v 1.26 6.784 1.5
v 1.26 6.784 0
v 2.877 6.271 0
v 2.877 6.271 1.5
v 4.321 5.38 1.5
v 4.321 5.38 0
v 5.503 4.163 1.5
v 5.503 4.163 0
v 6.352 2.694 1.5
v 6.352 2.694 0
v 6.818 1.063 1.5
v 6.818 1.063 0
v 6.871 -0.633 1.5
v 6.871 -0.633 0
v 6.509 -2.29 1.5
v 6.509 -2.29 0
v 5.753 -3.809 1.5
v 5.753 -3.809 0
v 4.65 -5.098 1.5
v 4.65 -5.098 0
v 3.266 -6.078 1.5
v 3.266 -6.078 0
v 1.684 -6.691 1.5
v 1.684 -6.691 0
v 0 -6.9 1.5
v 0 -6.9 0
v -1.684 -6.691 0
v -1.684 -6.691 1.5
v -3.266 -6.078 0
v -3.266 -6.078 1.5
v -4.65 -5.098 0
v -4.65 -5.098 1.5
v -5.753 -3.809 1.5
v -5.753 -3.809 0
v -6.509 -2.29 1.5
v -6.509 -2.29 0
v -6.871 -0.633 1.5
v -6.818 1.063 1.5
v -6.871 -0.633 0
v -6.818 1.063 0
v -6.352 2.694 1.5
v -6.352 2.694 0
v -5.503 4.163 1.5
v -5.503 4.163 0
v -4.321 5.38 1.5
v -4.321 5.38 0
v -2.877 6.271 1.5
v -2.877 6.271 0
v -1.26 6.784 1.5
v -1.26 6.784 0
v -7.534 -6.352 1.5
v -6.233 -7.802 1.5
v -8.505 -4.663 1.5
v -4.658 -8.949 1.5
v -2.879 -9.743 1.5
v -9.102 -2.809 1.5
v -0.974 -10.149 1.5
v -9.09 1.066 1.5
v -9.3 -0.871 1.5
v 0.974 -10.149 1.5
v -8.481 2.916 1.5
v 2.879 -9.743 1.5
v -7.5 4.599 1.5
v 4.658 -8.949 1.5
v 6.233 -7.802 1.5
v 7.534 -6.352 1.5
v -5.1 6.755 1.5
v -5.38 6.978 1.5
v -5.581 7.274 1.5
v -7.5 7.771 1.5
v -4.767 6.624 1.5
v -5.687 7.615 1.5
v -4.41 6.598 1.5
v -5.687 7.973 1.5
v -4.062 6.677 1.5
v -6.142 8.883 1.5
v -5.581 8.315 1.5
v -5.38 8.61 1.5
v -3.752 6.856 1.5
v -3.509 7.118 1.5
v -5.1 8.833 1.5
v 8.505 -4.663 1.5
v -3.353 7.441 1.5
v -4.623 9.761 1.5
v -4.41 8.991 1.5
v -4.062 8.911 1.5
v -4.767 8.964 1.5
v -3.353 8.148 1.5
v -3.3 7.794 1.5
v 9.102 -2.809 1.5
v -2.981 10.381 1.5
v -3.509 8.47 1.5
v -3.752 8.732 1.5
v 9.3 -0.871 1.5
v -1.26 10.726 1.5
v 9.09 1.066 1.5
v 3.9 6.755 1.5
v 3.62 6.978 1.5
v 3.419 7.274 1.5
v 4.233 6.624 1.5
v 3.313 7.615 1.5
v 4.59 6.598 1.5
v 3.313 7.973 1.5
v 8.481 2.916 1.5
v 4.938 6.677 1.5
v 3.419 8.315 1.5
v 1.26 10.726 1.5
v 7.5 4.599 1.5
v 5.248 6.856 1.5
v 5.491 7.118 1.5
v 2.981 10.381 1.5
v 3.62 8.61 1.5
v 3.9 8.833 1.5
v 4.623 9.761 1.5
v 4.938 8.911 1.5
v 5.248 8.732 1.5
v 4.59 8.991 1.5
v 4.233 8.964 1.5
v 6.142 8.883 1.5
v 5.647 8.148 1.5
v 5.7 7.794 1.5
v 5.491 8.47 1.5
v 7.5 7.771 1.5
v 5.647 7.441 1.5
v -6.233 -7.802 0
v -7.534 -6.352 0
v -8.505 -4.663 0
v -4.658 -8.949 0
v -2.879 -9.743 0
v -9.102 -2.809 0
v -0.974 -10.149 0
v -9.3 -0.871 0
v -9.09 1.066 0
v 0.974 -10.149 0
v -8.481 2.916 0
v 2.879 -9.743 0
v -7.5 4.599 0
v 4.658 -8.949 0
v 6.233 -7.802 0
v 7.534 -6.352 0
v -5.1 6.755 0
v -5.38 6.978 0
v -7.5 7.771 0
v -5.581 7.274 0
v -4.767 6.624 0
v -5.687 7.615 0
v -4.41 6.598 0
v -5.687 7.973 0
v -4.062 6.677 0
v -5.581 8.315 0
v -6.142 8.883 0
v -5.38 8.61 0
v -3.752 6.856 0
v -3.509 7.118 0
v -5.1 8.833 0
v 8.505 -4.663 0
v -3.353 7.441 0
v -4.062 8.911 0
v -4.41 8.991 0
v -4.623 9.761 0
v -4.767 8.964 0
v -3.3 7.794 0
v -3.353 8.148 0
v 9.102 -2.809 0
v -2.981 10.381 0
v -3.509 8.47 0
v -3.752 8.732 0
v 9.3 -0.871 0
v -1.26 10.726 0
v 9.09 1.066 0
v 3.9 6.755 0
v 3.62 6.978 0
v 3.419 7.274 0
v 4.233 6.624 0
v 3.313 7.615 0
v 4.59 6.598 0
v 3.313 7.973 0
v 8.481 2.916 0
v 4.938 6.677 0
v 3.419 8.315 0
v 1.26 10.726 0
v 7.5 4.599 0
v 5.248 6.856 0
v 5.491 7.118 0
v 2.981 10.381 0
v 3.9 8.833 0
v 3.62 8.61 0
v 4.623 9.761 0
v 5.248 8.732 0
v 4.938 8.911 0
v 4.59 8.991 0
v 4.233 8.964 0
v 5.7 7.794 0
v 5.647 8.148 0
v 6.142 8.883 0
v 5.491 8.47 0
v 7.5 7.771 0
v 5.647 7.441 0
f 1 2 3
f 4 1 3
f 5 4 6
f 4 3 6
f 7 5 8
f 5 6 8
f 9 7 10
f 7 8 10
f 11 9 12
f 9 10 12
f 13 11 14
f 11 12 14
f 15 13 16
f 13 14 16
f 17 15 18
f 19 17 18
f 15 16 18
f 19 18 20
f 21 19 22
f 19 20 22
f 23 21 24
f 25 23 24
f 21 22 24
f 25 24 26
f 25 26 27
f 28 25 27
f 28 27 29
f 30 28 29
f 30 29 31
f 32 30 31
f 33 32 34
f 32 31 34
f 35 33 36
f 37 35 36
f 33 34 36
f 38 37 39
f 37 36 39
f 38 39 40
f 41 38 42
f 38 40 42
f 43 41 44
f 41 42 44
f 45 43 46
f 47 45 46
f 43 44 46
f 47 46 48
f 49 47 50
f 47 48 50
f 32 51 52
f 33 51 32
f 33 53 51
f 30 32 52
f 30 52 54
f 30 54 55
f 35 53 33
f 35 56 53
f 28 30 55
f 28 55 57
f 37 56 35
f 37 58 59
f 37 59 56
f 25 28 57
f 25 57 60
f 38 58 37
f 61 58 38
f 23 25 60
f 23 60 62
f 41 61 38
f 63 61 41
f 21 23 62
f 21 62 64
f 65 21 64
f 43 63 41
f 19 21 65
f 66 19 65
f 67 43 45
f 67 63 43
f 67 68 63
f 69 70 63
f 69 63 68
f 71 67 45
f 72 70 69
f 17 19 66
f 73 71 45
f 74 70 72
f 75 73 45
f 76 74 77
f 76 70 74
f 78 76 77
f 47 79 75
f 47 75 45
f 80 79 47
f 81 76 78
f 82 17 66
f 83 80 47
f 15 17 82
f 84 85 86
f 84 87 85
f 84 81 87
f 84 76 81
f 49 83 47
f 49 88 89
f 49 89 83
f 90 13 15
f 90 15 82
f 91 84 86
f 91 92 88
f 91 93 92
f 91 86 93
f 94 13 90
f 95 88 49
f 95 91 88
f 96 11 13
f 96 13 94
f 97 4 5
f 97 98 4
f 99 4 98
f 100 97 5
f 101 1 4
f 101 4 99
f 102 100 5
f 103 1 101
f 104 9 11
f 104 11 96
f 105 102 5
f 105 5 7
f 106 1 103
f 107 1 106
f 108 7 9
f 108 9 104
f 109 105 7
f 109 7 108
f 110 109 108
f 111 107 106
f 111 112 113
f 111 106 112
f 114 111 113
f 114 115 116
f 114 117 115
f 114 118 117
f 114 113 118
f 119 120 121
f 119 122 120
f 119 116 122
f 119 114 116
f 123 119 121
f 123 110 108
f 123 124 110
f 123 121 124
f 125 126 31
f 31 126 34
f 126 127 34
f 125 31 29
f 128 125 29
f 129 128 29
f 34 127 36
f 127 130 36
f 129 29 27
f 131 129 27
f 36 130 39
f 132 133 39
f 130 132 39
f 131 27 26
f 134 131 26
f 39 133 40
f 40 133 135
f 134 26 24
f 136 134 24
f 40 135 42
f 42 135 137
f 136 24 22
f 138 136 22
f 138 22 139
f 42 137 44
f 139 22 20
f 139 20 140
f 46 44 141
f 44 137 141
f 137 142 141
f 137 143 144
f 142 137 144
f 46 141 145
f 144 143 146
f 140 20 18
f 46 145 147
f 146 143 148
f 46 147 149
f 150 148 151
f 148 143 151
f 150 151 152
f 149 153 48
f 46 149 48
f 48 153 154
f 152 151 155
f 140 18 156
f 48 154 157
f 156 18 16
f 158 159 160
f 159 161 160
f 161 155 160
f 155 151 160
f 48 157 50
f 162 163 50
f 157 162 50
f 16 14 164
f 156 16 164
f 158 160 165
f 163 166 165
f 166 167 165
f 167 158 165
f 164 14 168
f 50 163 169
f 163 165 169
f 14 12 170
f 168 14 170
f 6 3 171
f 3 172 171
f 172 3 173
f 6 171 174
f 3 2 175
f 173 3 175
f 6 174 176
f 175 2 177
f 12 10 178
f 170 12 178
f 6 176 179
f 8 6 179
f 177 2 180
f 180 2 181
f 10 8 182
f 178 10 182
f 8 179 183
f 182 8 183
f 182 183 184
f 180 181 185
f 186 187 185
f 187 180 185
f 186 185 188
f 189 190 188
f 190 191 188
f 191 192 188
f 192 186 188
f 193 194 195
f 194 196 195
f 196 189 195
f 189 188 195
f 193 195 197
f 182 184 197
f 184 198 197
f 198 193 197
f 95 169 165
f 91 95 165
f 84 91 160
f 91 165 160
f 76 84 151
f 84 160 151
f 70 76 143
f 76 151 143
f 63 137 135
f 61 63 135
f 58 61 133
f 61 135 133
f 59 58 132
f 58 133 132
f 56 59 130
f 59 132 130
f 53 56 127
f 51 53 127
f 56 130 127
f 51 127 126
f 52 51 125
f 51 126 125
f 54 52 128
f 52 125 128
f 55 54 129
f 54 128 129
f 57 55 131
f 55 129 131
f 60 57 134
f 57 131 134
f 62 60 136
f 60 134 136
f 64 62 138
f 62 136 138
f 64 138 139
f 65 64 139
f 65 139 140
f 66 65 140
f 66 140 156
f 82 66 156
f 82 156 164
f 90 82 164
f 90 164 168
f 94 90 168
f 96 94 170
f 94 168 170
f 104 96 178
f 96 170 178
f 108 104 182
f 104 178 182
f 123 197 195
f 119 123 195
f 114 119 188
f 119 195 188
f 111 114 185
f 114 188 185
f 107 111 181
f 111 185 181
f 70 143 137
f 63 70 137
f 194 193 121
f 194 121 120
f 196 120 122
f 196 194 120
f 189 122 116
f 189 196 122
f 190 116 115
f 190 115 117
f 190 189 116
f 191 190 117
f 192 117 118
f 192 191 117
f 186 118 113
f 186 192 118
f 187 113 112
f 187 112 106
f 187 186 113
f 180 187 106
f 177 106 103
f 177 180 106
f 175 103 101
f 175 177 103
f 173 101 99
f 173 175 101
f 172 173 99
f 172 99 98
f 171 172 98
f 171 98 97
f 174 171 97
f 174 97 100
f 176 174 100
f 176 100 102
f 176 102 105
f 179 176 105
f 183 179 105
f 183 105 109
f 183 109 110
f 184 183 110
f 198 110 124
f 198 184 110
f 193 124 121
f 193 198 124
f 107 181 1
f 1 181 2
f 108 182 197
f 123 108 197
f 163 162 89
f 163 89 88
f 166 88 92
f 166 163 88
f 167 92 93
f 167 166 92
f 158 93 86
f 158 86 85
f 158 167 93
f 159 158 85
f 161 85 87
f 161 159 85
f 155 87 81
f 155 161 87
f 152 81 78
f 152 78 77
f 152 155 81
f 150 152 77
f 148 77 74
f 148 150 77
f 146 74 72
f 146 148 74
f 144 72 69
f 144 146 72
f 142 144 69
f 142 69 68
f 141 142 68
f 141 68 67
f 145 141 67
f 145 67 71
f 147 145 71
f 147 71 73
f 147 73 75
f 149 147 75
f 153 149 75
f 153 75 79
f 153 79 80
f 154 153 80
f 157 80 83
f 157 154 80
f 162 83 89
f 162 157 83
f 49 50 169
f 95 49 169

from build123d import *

# Parameters (mm, degrees)
F0_R     = 0.4
F1_DEPTH = 0.5
F2_SCALE = 3


with BuildPart() as f1:
    # F0 (on Top) → F1 (new body)
    with BuildSketch(Plane.XY):
        with BuildLine():
            Line((2.5, 1.533030278), (2.5, 2.5903667694))
            ThreePointArc((2.5, 2.5903667694), (1.5408376054, 3.2535856334), (0.42, 3.5754160597))
            Line((0.42, 3.5754160597), (0.42, 2.261327044))
            ThreePointArc((0.42, 2.261327044), (0, -2.3), (-0.42, 2.261327044))
            Line((-0.42, 2.261327044), (-0.42, 3.5754160597))
            ThreePointArc((-0.42, 3.5754160597), (-1.5408376054, 3.2535856334), (-2.5, 2.5903667694))
            Line((-2.5, 2.5903667694), (-2.5, 1.533030278))
            ThreePointArc((-2.5, 1.533030278), (0, -3.4), (2.5, 1.533030278))
        make_face()
        with Locations((-1.5, 2.5980762114)):
            Circle(F0_R, mode=Mode.SUBTRACT)
        with Locations((1.5, 2.5980762114)):
            Circle(F0_R, mode=Mode.SUBTRACT)
    extrude(amount=F1_DEPTH)


with BuildPart() as f1_1:
    # F2: moved
    add(f1.part.scale(F2_SCALE))


solid = f1_1.part
